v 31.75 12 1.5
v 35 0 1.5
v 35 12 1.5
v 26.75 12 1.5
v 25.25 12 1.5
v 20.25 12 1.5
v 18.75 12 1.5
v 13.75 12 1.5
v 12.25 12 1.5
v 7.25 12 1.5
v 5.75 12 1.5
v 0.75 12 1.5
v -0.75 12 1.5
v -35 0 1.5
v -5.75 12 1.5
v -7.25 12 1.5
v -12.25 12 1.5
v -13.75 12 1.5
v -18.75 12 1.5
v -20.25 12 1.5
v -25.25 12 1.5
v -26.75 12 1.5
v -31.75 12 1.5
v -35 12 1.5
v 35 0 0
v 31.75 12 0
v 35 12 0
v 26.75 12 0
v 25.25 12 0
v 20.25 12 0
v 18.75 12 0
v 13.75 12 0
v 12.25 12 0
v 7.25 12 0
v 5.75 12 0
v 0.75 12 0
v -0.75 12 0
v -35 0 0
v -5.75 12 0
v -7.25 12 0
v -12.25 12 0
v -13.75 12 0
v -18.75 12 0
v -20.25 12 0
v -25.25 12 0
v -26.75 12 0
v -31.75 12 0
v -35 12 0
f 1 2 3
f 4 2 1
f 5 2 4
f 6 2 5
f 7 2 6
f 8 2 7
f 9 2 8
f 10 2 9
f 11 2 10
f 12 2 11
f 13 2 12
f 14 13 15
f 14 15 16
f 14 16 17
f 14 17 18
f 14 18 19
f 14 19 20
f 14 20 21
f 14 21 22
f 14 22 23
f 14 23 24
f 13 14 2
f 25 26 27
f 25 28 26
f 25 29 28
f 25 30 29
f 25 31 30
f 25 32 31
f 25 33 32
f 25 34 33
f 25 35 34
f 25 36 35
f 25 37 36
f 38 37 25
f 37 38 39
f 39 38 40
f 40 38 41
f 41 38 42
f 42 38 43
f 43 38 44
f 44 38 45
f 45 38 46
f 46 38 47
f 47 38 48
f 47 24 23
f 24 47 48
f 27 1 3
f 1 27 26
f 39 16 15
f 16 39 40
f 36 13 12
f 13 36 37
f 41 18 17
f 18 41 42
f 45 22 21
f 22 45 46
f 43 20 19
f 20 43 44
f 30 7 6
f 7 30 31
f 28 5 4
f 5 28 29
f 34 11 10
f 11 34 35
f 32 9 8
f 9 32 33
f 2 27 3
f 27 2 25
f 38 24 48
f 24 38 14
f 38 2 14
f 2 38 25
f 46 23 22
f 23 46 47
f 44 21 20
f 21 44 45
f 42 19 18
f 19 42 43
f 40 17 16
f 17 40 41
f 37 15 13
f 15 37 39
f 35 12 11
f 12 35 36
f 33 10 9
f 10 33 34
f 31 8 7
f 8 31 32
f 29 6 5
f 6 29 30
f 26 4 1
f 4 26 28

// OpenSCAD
// Agarose gel comb - a flat plate with a back bar and a row of rectangular teeth for casting
// horizontal gels. NOVEL general part, printed lying flat on the bed.
//

teeth = 10;
bar_L = 70;
bar_W = 12;
t     = 1.5;
tooth_W = 5.0;
tooth_L = 12;
gap    = 1.5;

$fn = 48;

teeth_X = tooth_W * teeth + (teeth - 1) * gap;

difference() {
    union() {
        translate([-bar_L / 2, 0, 0]) cube([bar_L, bar_W, t]);                 // back bar
        for (i = [0 : teeth - 1])
            translate([-(teeth_X / 2) + i * (tooth_W + gap), bar_W, 0])
                cube([tooth_W, tooth_L, t]);                                  // teeth
    }
    for (i = [0 : teeth - 1])
        translate([-(teeth_X / 2) + i * (tooth_W + gap), bar_W, 0])
            cube([tooth_W, tooth_L, t + 1]);                                 // cut the tooth roots
}
